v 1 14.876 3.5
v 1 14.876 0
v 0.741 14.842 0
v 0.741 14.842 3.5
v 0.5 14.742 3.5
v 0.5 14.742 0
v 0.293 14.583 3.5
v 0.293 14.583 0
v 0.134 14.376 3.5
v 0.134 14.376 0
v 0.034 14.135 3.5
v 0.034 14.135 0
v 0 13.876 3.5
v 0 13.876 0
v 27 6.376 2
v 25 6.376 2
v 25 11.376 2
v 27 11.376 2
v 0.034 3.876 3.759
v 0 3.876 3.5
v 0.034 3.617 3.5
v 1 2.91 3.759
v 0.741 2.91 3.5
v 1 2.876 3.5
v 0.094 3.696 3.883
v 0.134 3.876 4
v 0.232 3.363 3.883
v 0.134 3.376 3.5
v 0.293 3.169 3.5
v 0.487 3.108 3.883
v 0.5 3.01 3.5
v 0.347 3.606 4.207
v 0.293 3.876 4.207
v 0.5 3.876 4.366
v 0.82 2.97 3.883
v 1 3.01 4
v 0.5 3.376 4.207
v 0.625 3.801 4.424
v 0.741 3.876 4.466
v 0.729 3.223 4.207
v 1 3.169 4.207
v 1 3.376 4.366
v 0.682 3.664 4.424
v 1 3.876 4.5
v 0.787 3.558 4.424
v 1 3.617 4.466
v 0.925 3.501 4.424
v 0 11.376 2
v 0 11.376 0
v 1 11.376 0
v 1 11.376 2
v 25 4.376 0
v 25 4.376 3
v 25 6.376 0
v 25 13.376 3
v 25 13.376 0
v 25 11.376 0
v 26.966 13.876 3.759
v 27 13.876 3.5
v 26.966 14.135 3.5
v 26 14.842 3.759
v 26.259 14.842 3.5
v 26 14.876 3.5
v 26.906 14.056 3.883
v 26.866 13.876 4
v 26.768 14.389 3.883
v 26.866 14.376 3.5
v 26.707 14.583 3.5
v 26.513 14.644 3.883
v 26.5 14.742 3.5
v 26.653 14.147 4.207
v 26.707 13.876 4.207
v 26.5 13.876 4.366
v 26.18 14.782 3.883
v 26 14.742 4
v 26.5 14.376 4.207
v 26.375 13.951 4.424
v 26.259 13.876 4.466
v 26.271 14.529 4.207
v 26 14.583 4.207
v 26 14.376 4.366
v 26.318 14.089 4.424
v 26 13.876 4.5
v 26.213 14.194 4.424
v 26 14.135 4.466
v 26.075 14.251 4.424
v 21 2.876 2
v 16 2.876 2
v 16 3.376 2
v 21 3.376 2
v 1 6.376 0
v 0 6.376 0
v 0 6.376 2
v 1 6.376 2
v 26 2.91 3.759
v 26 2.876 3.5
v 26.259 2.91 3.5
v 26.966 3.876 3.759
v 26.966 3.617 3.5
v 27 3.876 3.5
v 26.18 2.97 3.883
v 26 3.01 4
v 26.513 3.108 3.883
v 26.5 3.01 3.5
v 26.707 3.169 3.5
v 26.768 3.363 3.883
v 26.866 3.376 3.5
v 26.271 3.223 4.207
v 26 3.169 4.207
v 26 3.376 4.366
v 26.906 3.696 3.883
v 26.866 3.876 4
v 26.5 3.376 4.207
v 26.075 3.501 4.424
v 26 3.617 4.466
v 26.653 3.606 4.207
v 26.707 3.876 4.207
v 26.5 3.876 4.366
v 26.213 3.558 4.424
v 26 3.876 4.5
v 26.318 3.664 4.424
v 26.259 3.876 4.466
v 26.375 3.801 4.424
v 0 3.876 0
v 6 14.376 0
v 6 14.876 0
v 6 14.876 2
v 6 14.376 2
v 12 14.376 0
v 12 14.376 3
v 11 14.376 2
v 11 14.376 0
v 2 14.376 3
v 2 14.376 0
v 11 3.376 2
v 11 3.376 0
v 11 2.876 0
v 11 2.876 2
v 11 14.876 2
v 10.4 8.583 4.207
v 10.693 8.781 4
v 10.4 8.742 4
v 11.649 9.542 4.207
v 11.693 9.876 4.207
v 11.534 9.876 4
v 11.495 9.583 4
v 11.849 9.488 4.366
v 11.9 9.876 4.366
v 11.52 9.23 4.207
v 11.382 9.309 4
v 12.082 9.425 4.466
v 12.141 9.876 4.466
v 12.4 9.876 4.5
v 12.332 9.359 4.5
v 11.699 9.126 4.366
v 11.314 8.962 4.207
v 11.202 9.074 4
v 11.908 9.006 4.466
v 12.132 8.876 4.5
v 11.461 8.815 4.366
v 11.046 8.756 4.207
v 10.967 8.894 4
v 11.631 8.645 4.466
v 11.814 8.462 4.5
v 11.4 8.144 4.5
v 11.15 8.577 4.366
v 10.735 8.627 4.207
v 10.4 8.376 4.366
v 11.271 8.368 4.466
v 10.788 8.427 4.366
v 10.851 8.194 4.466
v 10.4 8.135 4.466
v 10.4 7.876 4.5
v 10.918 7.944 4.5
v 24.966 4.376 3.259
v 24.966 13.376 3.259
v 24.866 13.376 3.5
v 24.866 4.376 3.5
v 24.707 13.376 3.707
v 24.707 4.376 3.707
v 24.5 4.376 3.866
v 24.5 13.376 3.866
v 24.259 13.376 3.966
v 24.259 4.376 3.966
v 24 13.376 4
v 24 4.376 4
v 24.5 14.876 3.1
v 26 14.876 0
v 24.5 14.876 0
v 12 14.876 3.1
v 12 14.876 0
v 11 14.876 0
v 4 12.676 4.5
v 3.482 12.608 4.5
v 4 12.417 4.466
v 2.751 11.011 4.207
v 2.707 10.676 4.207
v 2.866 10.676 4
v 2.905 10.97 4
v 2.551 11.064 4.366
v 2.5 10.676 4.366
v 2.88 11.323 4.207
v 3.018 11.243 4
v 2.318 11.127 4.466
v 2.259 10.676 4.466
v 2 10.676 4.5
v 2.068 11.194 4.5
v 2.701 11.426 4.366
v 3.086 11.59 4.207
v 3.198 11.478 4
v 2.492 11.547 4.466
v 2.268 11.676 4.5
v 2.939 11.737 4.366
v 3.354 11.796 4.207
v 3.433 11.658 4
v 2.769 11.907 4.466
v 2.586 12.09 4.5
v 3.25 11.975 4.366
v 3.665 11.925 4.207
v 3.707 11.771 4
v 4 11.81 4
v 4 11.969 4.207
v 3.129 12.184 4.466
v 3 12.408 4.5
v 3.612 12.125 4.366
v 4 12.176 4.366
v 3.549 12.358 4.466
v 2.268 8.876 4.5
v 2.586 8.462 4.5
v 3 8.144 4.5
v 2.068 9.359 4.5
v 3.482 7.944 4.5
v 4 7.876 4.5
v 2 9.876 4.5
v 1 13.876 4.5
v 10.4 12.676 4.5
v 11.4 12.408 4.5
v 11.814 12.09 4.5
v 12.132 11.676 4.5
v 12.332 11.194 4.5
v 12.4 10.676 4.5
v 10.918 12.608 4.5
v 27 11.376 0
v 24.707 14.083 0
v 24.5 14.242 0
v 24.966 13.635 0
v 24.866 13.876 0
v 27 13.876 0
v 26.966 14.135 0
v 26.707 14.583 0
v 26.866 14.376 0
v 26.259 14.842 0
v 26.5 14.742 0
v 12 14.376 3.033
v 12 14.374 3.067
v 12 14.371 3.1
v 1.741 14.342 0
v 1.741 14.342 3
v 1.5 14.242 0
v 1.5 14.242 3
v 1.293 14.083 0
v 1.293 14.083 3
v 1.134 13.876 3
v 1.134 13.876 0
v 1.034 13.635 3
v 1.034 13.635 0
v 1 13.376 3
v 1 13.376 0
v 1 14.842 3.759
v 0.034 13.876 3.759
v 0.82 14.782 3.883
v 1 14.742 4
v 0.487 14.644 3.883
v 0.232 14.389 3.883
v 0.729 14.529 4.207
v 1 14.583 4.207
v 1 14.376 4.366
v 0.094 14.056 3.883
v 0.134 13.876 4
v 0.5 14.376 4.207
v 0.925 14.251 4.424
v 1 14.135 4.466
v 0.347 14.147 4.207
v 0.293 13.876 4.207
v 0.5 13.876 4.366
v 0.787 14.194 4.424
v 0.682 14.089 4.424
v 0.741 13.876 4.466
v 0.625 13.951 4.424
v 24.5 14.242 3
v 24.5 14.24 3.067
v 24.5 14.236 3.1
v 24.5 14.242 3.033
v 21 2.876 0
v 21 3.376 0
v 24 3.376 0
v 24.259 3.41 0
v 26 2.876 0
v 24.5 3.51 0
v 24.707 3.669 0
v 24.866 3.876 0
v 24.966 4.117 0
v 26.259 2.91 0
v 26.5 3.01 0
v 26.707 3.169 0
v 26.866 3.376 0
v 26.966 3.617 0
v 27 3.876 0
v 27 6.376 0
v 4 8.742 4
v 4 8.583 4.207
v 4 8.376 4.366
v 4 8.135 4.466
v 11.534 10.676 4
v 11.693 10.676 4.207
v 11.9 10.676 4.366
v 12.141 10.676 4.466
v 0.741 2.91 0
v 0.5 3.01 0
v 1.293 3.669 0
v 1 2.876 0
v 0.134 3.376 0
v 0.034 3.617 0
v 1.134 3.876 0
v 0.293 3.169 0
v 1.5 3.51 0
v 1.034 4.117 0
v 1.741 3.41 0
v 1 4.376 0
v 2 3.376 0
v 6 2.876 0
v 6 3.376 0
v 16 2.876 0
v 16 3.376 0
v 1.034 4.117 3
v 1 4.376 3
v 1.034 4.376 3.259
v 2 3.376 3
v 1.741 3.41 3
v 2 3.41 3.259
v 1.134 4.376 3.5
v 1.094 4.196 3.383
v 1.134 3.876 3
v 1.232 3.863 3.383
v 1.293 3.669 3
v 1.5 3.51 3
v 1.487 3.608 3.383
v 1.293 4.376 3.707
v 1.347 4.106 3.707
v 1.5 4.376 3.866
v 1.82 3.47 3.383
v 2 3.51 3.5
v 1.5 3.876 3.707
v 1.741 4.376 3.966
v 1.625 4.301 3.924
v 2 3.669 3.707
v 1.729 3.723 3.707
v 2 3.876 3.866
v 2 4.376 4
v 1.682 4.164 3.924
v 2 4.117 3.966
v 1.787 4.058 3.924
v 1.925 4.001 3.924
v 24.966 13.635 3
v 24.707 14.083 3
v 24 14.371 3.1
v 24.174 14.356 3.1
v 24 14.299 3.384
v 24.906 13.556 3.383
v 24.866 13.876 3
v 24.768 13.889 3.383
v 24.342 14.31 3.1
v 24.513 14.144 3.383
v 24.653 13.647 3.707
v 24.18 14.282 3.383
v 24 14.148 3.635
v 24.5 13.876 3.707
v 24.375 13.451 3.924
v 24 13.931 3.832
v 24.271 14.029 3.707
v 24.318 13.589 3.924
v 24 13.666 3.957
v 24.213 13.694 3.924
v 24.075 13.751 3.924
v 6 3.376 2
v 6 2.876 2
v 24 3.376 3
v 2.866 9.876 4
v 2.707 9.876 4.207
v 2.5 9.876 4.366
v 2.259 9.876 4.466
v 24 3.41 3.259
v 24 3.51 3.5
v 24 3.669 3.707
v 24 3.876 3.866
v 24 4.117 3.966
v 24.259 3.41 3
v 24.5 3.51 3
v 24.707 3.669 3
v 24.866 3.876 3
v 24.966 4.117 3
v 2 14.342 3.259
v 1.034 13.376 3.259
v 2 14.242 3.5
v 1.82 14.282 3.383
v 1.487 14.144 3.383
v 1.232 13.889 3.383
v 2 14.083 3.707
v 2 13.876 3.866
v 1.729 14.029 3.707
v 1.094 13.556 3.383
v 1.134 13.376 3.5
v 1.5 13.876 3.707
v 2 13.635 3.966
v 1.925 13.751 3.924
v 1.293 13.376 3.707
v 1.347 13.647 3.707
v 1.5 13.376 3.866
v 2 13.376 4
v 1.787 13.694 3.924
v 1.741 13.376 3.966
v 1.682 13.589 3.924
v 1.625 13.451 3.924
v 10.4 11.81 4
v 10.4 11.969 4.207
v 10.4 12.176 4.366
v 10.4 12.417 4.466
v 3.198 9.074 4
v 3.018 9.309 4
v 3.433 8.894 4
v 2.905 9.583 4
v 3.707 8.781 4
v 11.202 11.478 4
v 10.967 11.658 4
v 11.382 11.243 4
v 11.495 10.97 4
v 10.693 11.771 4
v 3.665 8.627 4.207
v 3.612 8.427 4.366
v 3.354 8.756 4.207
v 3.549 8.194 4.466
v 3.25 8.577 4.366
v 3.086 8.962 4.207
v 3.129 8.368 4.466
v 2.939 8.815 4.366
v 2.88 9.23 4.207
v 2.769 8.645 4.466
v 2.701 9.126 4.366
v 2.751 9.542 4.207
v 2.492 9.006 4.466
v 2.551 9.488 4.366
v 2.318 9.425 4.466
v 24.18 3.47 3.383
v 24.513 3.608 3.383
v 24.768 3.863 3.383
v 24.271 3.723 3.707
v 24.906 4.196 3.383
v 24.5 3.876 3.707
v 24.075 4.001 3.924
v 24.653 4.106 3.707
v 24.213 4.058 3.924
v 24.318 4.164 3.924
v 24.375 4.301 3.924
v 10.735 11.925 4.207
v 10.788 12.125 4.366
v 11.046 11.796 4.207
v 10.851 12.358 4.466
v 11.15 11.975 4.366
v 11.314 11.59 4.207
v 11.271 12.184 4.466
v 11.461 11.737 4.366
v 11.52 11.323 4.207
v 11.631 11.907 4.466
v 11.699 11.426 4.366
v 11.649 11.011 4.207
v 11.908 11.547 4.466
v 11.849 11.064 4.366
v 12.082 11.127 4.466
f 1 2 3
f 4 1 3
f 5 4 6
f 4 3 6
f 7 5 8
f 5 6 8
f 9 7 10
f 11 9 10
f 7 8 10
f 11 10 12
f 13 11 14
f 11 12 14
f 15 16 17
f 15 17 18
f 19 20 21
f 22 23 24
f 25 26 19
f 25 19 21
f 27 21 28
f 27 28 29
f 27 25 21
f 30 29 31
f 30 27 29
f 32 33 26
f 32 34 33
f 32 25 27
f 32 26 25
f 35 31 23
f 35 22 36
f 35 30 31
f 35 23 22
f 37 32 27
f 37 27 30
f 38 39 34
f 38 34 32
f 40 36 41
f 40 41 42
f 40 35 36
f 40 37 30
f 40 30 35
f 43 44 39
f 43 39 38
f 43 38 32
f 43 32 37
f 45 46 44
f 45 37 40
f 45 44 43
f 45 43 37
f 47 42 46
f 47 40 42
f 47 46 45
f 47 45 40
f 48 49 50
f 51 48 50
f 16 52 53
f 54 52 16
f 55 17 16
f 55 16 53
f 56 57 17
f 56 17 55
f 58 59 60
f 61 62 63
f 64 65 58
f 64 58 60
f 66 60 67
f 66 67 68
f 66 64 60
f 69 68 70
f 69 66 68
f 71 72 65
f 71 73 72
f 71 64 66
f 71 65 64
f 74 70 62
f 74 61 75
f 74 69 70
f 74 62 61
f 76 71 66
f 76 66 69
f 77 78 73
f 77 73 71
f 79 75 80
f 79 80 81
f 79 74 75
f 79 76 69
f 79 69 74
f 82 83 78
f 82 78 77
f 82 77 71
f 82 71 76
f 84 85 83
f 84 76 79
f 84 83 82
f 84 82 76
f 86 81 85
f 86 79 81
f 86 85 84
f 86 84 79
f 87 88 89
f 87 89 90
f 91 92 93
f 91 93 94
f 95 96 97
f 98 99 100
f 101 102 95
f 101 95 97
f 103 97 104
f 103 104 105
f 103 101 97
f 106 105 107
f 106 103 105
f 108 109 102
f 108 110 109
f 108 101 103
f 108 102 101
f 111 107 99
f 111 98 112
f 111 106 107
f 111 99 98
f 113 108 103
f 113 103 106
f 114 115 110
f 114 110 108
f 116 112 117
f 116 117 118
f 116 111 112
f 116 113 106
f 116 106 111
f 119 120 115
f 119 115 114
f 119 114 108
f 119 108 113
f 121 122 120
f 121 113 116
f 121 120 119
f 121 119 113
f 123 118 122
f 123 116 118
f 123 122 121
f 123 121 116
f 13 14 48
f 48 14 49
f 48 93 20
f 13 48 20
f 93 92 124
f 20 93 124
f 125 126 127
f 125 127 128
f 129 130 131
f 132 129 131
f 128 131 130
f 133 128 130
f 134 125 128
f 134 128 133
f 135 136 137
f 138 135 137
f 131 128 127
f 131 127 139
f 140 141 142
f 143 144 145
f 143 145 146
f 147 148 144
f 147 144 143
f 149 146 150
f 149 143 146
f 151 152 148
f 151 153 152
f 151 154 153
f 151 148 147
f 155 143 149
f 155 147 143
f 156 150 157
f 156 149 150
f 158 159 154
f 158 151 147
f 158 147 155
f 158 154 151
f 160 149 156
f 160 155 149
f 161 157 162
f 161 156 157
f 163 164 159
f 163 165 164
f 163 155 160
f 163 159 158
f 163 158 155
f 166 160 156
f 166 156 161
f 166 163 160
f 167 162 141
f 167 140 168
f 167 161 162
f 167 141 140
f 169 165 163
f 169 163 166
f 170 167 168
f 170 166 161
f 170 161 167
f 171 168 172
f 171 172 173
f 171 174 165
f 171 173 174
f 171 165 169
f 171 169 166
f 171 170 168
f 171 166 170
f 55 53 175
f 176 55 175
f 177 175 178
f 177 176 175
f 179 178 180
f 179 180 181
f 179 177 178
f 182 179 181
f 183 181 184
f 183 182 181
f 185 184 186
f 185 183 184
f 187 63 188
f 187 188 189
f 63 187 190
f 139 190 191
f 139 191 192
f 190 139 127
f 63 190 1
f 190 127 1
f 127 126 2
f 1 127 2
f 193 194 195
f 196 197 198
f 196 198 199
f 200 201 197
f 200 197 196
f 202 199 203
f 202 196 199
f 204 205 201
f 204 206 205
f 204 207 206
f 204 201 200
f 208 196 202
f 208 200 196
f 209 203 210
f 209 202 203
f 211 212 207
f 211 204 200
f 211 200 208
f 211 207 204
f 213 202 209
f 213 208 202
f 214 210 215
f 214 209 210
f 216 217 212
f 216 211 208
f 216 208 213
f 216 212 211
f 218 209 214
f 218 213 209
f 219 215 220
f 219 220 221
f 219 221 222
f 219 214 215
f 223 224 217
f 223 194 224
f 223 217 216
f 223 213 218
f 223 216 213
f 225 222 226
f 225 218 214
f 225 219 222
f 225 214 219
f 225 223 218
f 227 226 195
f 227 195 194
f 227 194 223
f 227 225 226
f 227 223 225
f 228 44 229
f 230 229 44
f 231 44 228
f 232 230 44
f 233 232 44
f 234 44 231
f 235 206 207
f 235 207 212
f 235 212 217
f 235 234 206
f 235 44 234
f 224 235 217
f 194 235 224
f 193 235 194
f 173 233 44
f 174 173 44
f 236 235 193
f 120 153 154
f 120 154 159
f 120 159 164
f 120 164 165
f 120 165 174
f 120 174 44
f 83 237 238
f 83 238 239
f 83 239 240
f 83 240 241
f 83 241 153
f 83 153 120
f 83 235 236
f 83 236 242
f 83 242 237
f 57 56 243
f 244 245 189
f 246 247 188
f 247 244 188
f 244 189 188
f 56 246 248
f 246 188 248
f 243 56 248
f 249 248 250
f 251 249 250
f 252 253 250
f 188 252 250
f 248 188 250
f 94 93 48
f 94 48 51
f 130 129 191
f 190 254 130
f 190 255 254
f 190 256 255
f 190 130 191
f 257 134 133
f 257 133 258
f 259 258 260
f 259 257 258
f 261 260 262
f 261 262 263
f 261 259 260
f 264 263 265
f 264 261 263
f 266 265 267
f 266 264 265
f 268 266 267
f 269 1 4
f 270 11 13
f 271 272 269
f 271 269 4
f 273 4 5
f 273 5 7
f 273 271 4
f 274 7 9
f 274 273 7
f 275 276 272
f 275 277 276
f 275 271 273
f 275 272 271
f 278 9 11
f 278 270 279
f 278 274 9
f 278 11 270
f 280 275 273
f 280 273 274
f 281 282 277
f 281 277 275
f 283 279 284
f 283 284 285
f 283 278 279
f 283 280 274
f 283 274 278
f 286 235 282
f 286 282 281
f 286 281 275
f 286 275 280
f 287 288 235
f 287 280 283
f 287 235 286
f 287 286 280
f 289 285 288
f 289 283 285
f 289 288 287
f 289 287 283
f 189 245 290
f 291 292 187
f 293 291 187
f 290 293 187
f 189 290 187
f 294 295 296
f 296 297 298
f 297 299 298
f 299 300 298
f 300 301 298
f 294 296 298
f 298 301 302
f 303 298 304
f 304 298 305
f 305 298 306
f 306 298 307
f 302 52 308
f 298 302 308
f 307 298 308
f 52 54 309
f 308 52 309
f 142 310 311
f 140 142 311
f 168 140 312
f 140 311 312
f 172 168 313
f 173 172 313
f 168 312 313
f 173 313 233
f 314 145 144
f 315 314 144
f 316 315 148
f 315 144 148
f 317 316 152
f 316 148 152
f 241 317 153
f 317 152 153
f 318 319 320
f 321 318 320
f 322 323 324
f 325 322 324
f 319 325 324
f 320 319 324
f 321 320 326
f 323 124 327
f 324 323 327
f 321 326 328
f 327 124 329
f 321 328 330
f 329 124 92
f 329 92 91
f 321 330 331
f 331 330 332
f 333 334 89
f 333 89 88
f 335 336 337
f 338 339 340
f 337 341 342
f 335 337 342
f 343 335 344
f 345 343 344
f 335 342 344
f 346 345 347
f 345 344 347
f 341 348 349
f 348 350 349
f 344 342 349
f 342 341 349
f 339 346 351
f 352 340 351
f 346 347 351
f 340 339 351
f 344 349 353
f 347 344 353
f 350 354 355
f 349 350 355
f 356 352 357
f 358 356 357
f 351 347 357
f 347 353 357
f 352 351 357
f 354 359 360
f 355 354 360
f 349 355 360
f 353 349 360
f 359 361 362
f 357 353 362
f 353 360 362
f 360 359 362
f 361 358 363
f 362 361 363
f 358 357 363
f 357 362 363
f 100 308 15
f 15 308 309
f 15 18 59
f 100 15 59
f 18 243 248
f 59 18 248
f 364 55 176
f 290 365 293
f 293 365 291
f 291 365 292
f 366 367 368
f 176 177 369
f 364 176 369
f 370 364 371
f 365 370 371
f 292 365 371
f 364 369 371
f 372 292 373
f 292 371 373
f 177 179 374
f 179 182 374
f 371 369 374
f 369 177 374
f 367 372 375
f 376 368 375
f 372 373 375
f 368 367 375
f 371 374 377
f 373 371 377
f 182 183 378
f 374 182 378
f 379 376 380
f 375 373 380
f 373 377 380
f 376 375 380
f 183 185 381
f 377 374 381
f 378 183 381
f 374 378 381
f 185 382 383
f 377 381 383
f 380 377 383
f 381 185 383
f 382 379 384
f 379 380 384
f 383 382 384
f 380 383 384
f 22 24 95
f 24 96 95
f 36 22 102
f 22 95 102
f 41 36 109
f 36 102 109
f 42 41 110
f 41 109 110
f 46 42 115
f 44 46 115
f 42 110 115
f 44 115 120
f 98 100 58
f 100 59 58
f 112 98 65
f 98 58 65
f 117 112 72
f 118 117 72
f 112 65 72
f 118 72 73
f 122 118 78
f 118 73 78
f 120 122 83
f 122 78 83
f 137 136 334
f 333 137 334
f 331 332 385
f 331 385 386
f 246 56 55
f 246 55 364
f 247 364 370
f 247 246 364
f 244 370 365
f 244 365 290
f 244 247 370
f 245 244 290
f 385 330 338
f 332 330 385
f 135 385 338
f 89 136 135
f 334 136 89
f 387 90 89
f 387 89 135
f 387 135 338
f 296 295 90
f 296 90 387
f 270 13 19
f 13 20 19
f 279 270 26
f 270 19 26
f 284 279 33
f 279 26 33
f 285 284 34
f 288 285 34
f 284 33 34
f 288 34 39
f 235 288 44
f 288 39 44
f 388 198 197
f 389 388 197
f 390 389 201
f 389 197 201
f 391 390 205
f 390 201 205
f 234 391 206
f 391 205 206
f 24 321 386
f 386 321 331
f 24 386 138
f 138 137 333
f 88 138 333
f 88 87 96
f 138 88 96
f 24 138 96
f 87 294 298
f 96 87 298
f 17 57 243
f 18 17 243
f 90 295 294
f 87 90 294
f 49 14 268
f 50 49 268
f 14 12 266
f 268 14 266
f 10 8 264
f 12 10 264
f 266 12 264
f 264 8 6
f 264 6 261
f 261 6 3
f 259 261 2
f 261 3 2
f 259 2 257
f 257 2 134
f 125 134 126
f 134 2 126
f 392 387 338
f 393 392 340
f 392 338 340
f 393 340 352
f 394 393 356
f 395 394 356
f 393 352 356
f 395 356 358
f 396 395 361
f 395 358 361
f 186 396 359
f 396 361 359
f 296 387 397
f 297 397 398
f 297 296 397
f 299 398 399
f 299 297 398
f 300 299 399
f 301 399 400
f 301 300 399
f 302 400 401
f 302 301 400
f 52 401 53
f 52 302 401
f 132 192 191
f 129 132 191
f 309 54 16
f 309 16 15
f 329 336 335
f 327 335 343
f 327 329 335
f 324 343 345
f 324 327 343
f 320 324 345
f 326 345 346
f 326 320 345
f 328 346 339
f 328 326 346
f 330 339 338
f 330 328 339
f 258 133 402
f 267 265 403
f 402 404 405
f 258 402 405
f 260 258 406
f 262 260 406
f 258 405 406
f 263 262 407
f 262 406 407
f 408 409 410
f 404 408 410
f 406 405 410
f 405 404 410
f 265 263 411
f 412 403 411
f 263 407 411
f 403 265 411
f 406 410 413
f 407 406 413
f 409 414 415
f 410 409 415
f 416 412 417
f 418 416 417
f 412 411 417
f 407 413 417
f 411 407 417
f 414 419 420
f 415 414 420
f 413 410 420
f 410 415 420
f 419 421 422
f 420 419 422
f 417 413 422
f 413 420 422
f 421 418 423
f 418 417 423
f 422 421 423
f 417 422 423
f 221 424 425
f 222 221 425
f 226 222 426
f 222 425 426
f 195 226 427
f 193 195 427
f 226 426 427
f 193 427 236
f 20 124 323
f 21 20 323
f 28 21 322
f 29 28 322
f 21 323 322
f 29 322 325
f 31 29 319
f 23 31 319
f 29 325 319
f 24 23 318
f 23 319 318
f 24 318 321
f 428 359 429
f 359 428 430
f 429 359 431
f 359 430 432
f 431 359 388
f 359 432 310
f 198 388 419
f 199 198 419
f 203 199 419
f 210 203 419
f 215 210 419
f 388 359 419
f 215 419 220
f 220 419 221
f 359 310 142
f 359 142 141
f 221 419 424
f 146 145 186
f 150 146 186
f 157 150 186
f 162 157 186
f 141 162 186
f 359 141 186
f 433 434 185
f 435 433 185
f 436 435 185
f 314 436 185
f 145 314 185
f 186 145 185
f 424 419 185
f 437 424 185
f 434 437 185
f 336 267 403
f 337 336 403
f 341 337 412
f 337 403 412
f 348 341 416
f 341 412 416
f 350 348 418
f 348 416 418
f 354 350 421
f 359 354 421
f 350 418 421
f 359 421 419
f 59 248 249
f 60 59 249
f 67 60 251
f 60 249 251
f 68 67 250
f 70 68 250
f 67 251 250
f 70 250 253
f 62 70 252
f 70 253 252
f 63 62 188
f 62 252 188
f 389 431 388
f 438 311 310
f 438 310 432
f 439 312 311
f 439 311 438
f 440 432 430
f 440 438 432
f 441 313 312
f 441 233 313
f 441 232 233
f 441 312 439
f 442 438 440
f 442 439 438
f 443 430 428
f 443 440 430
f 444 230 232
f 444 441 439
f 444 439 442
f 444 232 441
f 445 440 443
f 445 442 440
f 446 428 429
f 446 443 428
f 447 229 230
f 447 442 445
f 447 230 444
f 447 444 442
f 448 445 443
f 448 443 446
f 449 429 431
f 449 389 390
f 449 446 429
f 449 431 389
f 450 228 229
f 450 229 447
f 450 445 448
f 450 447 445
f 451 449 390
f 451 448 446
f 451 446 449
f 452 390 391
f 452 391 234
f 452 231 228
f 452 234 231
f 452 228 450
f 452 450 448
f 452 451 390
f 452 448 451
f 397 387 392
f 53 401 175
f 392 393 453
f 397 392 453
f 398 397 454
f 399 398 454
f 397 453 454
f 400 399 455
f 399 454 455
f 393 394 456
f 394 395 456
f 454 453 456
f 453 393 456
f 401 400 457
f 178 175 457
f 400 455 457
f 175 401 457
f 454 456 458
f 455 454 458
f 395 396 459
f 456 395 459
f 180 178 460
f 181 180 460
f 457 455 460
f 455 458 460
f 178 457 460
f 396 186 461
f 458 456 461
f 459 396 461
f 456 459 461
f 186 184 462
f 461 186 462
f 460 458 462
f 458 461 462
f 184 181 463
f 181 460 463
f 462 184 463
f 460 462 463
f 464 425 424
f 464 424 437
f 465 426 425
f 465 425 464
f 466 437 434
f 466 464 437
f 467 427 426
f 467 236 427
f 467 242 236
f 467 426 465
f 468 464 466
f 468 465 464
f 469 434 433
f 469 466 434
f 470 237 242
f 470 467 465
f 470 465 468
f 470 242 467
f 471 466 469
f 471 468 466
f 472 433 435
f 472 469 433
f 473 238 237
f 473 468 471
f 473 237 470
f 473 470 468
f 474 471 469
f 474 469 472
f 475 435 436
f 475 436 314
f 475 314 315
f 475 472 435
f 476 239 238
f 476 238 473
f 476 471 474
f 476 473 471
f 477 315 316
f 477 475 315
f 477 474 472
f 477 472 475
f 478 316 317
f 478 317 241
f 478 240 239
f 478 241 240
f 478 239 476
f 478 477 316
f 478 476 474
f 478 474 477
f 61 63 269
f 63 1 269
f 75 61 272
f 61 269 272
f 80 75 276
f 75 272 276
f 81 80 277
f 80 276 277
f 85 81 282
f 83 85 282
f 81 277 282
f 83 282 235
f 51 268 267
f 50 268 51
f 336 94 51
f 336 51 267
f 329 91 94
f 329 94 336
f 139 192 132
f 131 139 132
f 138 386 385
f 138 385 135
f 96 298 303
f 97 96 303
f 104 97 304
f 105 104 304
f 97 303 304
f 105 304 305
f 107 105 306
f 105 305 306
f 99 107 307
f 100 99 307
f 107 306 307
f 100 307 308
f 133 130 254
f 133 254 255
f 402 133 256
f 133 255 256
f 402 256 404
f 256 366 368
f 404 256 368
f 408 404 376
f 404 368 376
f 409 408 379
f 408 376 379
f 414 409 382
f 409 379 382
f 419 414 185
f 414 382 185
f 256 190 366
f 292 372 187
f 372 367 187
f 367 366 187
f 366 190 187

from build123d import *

# Parameters (mm, degrees)
F1_DEPTH     = 4.5
F2_R         = 1
F4_DEPTH     = 4
F5_W         = 12.5
F5_H         = 2.9783394848
F6_DEPTH     = 3.1
F7_T1_DEPTH  = 22
F7_T3_DEPTH  = 9
F7_T6_ANGLE  = 90
F7_T10_DEPTH = 22
F7_T16_DEPTH = 22
F7_T22_DEPTH = 22
F7_T26_ANGLE = 90
F7_T30_ANGLE = 90
F7_T36_ANGLE = 90
F7_T42_ANGLE = 90
F7_T46_ANGLE = 90
F8_W         = 1
F8_H         = 5
F8_W_2       = 2
F8_W_3       = 5
F8_H_2       = 0.5
F9_DEPTH     = 2


# Not quite as in the source:
# - a fillet or chamfer that OpenCascade refuses, or shapes differently, is made with other operations: its cross-section is extruded or revolved along the edge and cut away or added


with BuildPart() as f1:
    # F0 (on Top) → F1 (new body)
    with BuildSketch(Plane.XY):
        with BuildLine():
            ThreePointArc((0, 3.8761399509), (0.2928932188, 3.1690331698), (1, 2.8761399509))
            Line((1, 2.8761399509), (26, 2.8761399509))
            ThreePointArc((26, 2.8761399509), (26.7071067812, 3.1690331698), (27, 3.8761399509))
            Line((27, 3.8761399509), (27, 13.8761399509))
            ThreePointArc((27, 13.8761399509), (26.7071067812, 14.5832467321), (26, 14.8761399509))
            Line((26, 14.8761399509), (1, 14.8761399509))
            ThreePointArc((1, 14.8761399509), (0.2928932188, 14.5832467321), (0, 13.8761399509))
            Line((0, 13.8761399509), (0, 3.8761399509))
        make_face()
        with BuildLine():
            ThreePointArc((3, 10.6761399509), (3.2928932188, 11.3832467321), (4, 11.6761399509))
            Line((4, 11.6761399509), (10.4, 11.6761399509))
            ThreePointArc((10.4, 11.6761399509), (11.1071067812, 11.3832467321), (11.4, 10.6761399509))
            Line((11.4, 10.6761399509), (11.4, 9.8761399509))
            ThreePointArc((11.4, 9.8761399509), (11.1071067812, 9.1690331698), (10.4, 8.8761399509))
            Line((10.4, 8.8761399509), (4, 8.8761399509))
            ThreePointArc((4, 8.8761399509), (3.2928932188, 9.1690331698), (3, 9.8761399509))
            Line((3, 9.8761399509), (3, 10.6761399509))
        make_face(mode=Mode.SUBTRACT)
    extrude(amount=F1_DEPTH)

    # F2
    f2_edges = [f1.edges().sort_by_distance(p)[0] for p in [
        (0.292893, 3.169033, 4.5),
        (13.5, 2.87614, 4.5),
        (26.707107, 3.169033, 4.5),
        (27, 8.87614, 4.5),
        (26.707107, 14.583247, 4.5),
        (13.5, 14.87614, 4.5),
        (0.292893, 14.583247, 4.5),
        (0, 8.87614, 4.5),
        (3.292893, 11.383247, 4.5),
        (7.2, 11.67614, 4.5),
        (11.107107, 11.383247, 4.5),
        (11.4, 10.27614, 4.5),
        (11.107107, 9.169033, 4.5),
        (7.2, 8.87614, 4.5),
        (3.292893, 9.169033, 4.5),
        (3, 10.27614, 4.5),
    ]]
    fillet(f2_edges, radius=F2_R)

    # F3 (on Top) → F4 (cut)
    with BuildSketch(Plane.XY):
        with BuildLine():
            ThreePointArc((25, 13.3761399509), (24.7071067812, 14.0832467321), (24, 14.3761399509))
            Line((24, 14.3761399509), (2, 14.3761399509))
            ThreePointArc((2, 14.3761399509), (1.2928932188, 14.0832467321), (1, 13.3761399509))
            Line((1, 13.3761399509), (1, 4.3761399509))
            ThreePointArc((1, 4.3761399509), (1.2928932188, 3.6690331698), (2, 3.3761399509))
            Line((2, 3.3761399509), (14.5, 3.3761399509))
            Line((14.5, 3.3761399509), (24, 3.3761399509))
            ThreePointArc((24, 3.3761399509), (24.7071067812, 3.6690331698), (25, 4.3761399509))
            Line((25, 4.3761399509), (25, 13.3761399509))
        make_face()
    extrude(amount=F4_DEPTH, mode=Mode.SUBTRACT)

    # F5 (on Top) → F6 (cut)
    with BuildSketch(Plane.XY):
        with Locations((18.25, 14.7778680548)):
            Rectangle(F5_W, F5_H)
    extrude(amount=F6_DEPTH, mode=Mode.SUBTRACT)

    # F7: fillet of radius 1 on 8 edges, made by hand

    # F7_s2 → F7_t1 (join)
    with BuildSketch(Plane.YZ.offset(2)):
        with BuildLine():
            ThreePointArc((3.3761399509, 3), (3.6690331698, 3.7071067812), (4.3761399509, 4))
            Line((4.3761399509, 4), (3.3761399509, 4))
            Line((3.3761399509, 4), (3.3761399509, 3))
        make_face()
    extrude(amount=F7_T1_DEPTH)

    # F7_s4 → F7_t3 (join)
    with BuildSketch(Plane.XZ.offset(-13.3761399509)):
        with BuildLine():
            ThreePointArc((25, 3), (24.7071067812, 3.7071067812), (24, 4))
            Line((24, 4), (25, 4))
            Line((25, 4), (25, 3))
        make_face()
        with BuildLine():
            ThreePointArc((1, 3), (1.2928932188, 3.7071067812), (2, 4))
            Line((2, 4), (1, 4))
            Line((1, 4), (1, 3))
        make_face()
    extrude(amount=F7_T3_DEPTH)

    # F7_s5 → F7_t6 (revolve)
    with BuildSketch(Plane.XZ.offset(-4.3761399509)):
        with BuildLine():
            ThreePointArc((1, 3), (1.2928932188, 3.7071067812), (2, 4))
            Line((2, 4), (1, 4))
            Line((1, 4), (1, 3))
        make_face()
    revolve(axis=Axis((2, 4.3761399509, 4), (0, 0, 1)), revolution_arc=F7_T6_ANGLE)


with BuildPart() as f7_tool8:
    # F7_s9 → F7_t10 (new body)
    with BuildSketch(Plane.YZ.offset(24)):
        with BuildLine():
            ThreePointArc((14.3761399509, 3), (14.0832467321, 3.7071067812), (13.3761399509, 4))
            Line((13.3761399509, 4), (14.3761399509, 4))
            Line((14.3761399509, 4), (14.3761399509, 3))
        make_face()
    extrude(amount=-F7_T10_DEPTH)

    split(bisect_by=Plane.YZ.offset(12), keep=Keep.TOP)

    split(bisect_by=Plane.XY.offset(3.1), keep=Keep.TOP)


with BuildPart() as f1_1:
    add(f1.part)

    # F7_t7: union F7_tool8
    add(f7_tool8.part)


with BuildPart() as f7_tool14:
    # F7_s15 → F7_t16 (new body)
    with BuildSketch(Plane.YZ.offset(24)):
        with BuildLine():
            ThreePointArc((14.3761399509, 3), (14.0832467321, 3.7071067812), (13.3761399509, 4))
            Line((13.3761399509, 4), (14.3761399509, 4))
            Line((14.3761399509, 4), (14.3761399509, 3))
        make_face()
    extrude(amount=-F7_T16_DEPTH)

    split(bisect_by=Plane.YZ.offset(12), keep=Keep.BOTTOM)

    split(bisect_by=Plane.XY.offset(3.1), keep=Keep.BOTTOM)


with BuildPart() as f1_2:
    add(f1_1.part)

    # F7_t13: union F7_tool14
    add(f7_tool14.part)


with BuildPart() as f7_tool20:
    # F7_s21 → F7_t22 (new body)
    with BuildSketch(Plane.YZ.offset(24)):
        with BuildLine():
            ThreePointArc((14.3761399509, 3), (14.0832467321, 3.7071067812), (13.3761399509, 4))
            Line((13.3761399509, 4), (14.3761399509, 4))
            Line((14.3761399509, 4), (14.3761399509, 3))
        make_face()
    extrude(amount=-F7_T22_DEPTH)

    split(bisect_by=Plane.YZ.offset(12), keep=Keep.BOTTOM)

    split(bisect_by=Plane.XY.offset(3.1), keep=Keep.TOP)


with BuildPart() as f1_3:
    add(f1_2.part)

    # F7_t19: union F7_tool20
    add(f7_tool20.part)

    # F7_s25 → F7_t26 (revolve)
    with BuildSketch(Plane.YZ.offset(2)):
        with BuildLine():
            ThreePointArc((14.3761399509, 3), (14.0832467321, 3.7071067812), (13.3761399509, 4))
            Line((13.3761399509, 4), (14.3761399509, 4))
            Line((14.3761399509, 4), (14.3761399509, 3))
        make_face()
    revolve(axis=Axis((2, 13.3761399509, 4), (0, 0, 1)), revolution_arc=F7_T26_ANGLE)


with BuildPart() as f7_tool28:
    # F7_s29 → F7_t30 (revolve)
    with BuildSketch(Plane.XZ.offset(-13.3761399509)):
        with BuildLine():
            ThreePointArc((25, 3), (24.7071067812, 3.7071067812), (24, 4))
            Line((24, 4), (25, 4))
            Line((25, 4), (25, 3))
        make_face()
    revolve(axis=Axis((24, 13.3761399509, 4), (0, 0, 1)), revolution_arc=F7_T30_ANGLE)

    split(bisect_by=Plane.YZ.offset(24.5), keep=Keep.TOP)

    split(bisect_by=Plane.XY.offset(3.1), keep=Keep.BOTTOM)


with BuildPart() as f1_4:
    add(f1_3.part)

    # F7_t27: union F7_tool28
    add(f7_tool28.part)


with BuildPart() as f7_tool34:
    # F7_s35 → F7_t36 (revolve)
    with BuildSketch(Plane.XZ.offset(-13.3761399509)):
        with BuildLine():
            ThreePointArc((25, 3), (24.7071067812, 3.7071067812), (24, 4))
            Line((24, 4), (25, 4))
            Line((25, 4), (25, 3))
        make_face()
    revolve(axis=Axis((24, 13.3761399509, 4), (0, 0, 1)), revolution_arc=F7_T36_ANGLE)

    split(bisect_by=Plane.YZ.offset(24.5), keep=Keep.TOP)

    split(bisect_by=Plane.XY.offset(3.1), keep=Keep.TOP)


with BuildPart() as f1_5:
    add(f1_4.part)

    # F7_t33: union F7_tool34
    add(f7_tool34.part)


with BuildPart() as f7_tool40:
    # F7_s41 → F7_t42 (revolve)
    with BuildSketch(Plane.XZ.offset(-13.3761399509)):
        with BuildLine():
            ThreePointArc((25, 3), (24.7071067812, 3.7071067812), (24, 4))
            Line((24, 4), (25, 4))
            Line((25, 4), (25, 3))
        make_face()
    revolve(axis=Axis((24, 13.3761399509, 4), (0, 0, 1)), revolution_arc=F7_T42_ANGLE)

    split(bisect_by=Plane.YZ.offset(24.5), keep=Keep.BOTTOM)

    split(bisect_by=Plane.XY.offset(3.1), keep=Keep.TOP)


with BuildPart() as f1_6:
    add(f1_5.part)

    # F7_t39: union F7_tool40
    add(f7_tool40.part)

    # F7_s45 → F7_t46 (revolve)
    with BuildSketch(Plane.YZ.offset(24)):
        with BuildLine():
            ThreePointArc((3.3761399509, 3), (3.6690331698, 3.7071067812), (4.3761399509, 4))
            Line((4.3761399509, 4), (3.3761399509, 4))
            Line((3.3761399509, 4), (3.3761399509, 3))
        make_face()
    revolve(axis=Axis((24, 4.3761399509, 4), (0, 0, 1)), revolution_arc=F7_T46_ANGLE)

    # F8 (on face) → F9 (cut)
    with BuildSketch(Plane(origin=(0, 0, 0), x_dir=(1, 0, 0), z_dir=(0, 0, -1))):
        with Locations((0.5, -8.8761399509)):
            Rectangle(F8_W, F8_H)
        with Locations((26, -8.8761399509)):
            Rectangle(F8_W_2, F8_H)
        with Locations((8.5, -3.1261399509)):
            Rectangle(F8_W_3, F8_H_2)
        with Locations((18.5, -3.1261399509)):
            Rectangle(F8_W_3, F8_H_2)
        with Locations((8.5, -14.6261399509)):
            Rectangle(F8_W_3, F8_H_2)
    extrude(amount=-F9_DEPTH, mode=Mode.SUBTRACT)


solid = f1_6.part
